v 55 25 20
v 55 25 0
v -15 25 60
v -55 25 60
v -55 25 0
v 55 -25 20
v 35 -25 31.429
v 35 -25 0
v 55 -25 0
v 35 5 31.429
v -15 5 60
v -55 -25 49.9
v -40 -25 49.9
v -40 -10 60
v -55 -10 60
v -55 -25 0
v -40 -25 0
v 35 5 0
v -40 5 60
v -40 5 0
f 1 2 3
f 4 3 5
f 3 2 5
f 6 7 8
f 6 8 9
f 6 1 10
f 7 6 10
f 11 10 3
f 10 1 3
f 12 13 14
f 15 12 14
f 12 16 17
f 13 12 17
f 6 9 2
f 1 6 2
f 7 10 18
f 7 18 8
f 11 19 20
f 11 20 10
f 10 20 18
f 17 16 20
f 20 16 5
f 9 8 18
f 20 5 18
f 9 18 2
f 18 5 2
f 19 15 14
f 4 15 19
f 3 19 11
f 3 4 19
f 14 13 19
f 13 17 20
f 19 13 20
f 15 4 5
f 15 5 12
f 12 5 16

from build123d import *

# Parameters (mm, degrees)
F1_DEPTH = 60
F3_DEPTH = 15
F5_DEPTH = 50


with BuildPart() as f1:
    # F0 (on Top) → F1 (new body)
    with BuildSketch(Plane.XY):
        Polygon((55, 25), (-55, 25), (-55, -25), (-40, -25), (-40, 5), (35, 5), (35, -25), (55, -25), align=None)
    extrude(amount=F1_DEPTH)

    # F2 (on face) → F3 (cut)
    with BuildSketch(Plane.YZ.offset(-40)):
        Polygon((-10, 60), (-25, 60), (-25, 49.899567), align=None)
    extrude(amount=-F3_DEPTH, mode=Mode.SUBTRACT)

    # F4 (on face) → F5 (cut)
    with BuildSketch(Plane(origin=(0, 25, 0), x_dir=(-1, 0, 0), z_dir=(0, 1, 0))):
        Polygon((-55, 20), (15, 60), (-55, 60), align=None)
    extrude(amount=-F5_DEPTH, mode=Mode.SUBTRACT)


solid = f1.part
